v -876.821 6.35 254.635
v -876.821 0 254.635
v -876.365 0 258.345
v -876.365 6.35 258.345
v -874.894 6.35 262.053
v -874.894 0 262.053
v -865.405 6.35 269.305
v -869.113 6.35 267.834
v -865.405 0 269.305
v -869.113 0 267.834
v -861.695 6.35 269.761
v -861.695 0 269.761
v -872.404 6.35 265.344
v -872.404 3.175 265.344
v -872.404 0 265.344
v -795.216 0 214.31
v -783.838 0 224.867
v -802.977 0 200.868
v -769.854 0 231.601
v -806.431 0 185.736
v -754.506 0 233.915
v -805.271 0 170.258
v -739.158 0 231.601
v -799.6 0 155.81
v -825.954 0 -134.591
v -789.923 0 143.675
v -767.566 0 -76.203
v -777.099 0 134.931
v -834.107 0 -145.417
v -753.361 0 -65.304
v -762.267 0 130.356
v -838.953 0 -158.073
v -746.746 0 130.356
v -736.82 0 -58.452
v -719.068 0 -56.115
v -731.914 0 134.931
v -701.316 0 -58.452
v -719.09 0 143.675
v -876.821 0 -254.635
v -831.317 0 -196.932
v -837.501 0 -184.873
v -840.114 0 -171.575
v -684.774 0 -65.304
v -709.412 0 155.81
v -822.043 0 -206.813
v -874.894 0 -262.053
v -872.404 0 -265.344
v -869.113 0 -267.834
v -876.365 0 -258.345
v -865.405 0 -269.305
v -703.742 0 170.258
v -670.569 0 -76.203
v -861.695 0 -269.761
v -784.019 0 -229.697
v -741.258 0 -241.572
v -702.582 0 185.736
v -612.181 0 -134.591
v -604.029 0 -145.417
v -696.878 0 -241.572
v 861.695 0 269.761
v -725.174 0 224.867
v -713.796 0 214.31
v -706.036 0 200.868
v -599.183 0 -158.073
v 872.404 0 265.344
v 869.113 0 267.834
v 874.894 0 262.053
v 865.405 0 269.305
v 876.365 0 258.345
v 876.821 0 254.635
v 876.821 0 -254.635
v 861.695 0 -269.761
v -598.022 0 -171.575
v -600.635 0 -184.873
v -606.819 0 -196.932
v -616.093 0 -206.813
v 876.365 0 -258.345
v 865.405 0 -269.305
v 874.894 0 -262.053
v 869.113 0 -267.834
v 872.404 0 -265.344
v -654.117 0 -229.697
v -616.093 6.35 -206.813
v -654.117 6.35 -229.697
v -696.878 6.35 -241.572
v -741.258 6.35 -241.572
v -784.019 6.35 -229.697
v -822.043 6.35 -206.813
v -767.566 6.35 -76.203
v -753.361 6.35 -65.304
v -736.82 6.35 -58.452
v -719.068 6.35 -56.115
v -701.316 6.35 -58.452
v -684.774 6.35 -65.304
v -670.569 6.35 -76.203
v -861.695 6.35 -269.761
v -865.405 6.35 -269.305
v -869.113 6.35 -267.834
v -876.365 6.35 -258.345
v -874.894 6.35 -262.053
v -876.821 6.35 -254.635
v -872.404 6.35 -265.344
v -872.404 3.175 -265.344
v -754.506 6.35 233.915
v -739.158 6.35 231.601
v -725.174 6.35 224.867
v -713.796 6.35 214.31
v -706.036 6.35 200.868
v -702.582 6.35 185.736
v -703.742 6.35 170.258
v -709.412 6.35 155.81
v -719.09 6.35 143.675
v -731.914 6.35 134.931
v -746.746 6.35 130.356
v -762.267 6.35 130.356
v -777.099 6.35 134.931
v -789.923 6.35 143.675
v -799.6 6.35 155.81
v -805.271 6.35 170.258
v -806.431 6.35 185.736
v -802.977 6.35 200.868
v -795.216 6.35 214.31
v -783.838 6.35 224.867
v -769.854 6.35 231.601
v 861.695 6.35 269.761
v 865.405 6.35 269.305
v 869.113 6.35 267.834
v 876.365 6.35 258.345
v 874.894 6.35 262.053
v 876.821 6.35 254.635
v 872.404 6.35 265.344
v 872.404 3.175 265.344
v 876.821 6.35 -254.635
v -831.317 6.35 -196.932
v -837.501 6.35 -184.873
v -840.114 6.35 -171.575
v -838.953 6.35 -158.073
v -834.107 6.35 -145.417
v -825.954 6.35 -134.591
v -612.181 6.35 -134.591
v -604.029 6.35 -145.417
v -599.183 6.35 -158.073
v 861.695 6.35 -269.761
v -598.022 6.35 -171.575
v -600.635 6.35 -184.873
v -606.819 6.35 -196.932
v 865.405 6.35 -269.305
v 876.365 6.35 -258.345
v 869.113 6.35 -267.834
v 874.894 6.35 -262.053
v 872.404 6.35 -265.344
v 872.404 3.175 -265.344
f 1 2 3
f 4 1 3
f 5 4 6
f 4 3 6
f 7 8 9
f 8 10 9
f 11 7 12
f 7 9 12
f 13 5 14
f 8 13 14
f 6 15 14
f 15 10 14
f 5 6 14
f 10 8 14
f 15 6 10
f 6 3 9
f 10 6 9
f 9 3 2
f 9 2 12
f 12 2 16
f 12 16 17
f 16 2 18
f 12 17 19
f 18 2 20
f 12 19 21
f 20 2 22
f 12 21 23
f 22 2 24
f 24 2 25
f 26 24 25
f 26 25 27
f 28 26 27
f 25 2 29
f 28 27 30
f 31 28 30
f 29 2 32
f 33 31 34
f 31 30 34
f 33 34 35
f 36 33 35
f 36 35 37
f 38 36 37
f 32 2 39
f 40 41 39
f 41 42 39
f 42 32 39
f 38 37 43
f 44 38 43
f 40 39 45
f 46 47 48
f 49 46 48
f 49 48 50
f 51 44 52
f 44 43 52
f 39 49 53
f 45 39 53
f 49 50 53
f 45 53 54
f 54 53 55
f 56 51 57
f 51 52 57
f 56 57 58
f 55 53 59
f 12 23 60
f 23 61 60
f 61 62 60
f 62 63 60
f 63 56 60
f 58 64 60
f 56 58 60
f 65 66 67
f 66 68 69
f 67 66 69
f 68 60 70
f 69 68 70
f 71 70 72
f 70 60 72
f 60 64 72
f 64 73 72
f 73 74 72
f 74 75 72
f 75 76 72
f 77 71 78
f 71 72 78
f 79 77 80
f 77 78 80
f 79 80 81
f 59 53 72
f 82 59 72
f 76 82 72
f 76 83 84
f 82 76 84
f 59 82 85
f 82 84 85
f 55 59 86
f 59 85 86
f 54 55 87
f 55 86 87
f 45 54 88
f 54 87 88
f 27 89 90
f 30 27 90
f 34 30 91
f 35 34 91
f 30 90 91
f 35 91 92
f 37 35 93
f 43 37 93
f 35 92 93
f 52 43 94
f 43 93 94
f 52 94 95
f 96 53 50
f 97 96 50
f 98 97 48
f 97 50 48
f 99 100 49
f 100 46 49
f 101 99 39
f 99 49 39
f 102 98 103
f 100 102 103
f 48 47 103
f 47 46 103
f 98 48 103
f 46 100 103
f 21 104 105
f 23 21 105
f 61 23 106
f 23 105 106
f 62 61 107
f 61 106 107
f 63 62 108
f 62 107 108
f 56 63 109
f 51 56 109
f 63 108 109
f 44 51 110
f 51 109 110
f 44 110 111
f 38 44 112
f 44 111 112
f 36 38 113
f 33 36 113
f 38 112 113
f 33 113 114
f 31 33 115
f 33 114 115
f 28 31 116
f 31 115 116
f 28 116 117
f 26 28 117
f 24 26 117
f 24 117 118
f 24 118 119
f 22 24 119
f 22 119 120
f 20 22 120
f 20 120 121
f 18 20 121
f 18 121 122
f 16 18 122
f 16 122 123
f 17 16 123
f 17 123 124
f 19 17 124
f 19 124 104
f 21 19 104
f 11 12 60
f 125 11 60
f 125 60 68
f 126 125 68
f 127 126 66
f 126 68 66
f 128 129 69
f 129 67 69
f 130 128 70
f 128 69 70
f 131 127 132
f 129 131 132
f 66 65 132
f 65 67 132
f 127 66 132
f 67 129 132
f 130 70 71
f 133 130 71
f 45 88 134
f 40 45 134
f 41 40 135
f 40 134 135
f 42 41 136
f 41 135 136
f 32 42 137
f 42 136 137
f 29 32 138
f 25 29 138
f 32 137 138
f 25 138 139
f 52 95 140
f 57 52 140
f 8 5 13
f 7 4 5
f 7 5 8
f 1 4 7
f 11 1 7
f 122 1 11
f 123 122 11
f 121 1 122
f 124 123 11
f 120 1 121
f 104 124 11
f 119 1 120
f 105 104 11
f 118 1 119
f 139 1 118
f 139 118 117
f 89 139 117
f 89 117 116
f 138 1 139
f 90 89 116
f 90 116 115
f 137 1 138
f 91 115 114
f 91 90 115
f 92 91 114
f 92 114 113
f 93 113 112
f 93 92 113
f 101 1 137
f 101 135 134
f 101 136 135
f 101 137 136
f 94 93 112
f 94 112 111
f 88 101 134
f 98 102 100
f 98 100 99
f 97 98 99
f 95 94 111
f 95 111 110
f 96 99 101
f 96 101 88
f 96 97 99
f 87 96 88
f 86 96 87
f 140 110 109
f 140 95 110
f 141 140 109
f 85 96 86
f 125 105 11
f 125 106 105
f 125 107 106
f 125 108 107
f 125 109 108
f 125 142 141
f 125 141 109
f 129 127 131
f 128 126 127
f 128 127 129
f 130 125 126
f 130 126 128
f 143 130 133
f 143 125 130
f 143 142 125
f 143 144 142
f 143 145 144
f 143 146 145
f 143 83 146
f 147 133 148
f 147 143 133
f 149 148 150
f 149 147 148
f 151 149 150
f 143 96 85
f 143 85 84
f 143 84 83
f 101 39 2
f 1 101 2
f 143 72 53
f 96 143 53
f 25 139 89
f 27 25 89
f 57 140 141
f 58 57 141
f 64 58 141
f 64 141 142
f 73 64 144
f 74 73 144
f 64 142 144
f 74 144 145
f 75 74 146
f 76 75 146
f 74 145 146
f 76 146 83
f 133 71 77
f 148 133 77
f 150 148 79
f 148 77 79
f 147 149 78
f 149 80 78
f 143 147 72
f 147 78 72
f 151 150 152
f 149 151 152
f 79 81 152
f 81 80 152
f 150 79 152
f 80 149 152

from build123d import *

# Parameters (mm, degrees)
BOSS_EXTRUDE1_DEPTH = 6.35
CUT_EXTRUDE1_DEPTH  = 918.402376548
SKETCH3_R           = 52.07
CUT_EXTRUDE2_DEPTH  = 918.402376548


with BuildPart() as part:
    # Sketch1 → Boss-Extrude1 (new body)
    with BuildSketch(Plane(origin=(0, 0, 0), x_dir=(1, 0, 0), z_dir=(0, 1, 0))):
        with BuildLine():
            Line((-861.694916994, -269.761320345), (861.694916994, -269.761320345))
            add(Edge.make_bspline(
                [(861.694916994, -269.761320345), (876.821320345, -269.761320345), (876.821320345, -254.634916994)],
                knots=[5.505213485, 5.505213485, 5.505213485, 7.061157129, 7.061157129, 7.061157129], degree=2, weights=[1, 0.712338451, 1]))
            Line((876.821320345, -254.634916994), (876.821320345, 254.634916994))
            add(Edge.make_bspline(
                [(876.821320345, 254.634916994), (876.821320345, 269.761320345), (861.694916994, 269.761320345)],
                knots=[5.505213485, 5.505213485, 5.505213485, 7.061157129, 7.061157129, 7.061157129], degree=2, weights=[1, 0.712338451, 1]))
            Line((861.694916994, 269.761320345), (-861.694916994, 269.761320345))
            add(Edge.make_bspline(
                [(-861.694916994, 269.761320345), (-876.821320345, 269.761320345), (-876.821320345, 254.634916994)],
                knots=[5.505213485, 5.505213485, 5.505213485, 7.061157129, 7.061157129, 7.061157129], degree=2, weights=[1, 0.712338451, 1]))
            Line((-876.821320345, 254.634916994), (-876.821320345, -254.634916994))
            add(Edge.make_bspline(
                [(-876.821320345, -254.634916994), (-876.821320345, -269.761320345), (-861.694916994, -269.761320345)],
                knots=[5.505213485, 5.505213485, 5.505213485, 7.061157129, 7.061157129, 7.061157129], degree=2, weights=[1, 0.712338451, 1]))
        make_face()
    extrude(amount=BOSS_EXTRUDE1_DEPTH)

    # Sketch2 → Cut-Extrude1 (cut, through all)
    with BuildSketch(Plane(origin=(0, 6.35, 0), x_dir=(1, 0, 0), z_dir=(0, 1, 0))):
        with BuildLine():
            Line((-825.954313113, 134.591457199), (-767.566332113, 76.203476199))
            ThreePointArc((-767.566332113, 76.203476199), (-719.067867535, 56.114754417), (-670.569402958, 76.203476199))
            Line((-670.569402958, 76.203476199), (-612.181421958, 134.591457199))
            ThreePointArc((-612.181421958, 134.591457199), (-598.021653058, 171.575128433), (-616.092530237, 206.813380252))
            ThreePointArc((-616.092530237, 206.813380252), (-719.067867535, 243.07718636), (-822.043204833, 206.813380252))
            ThreePointArc((-822.043204833, 206.813380252), (-840.114082012, 171.575128433), (-825.954313113, 134.591457199))
        make_face()
    extrude(amount=-CUT_EXTRUDE1_DEPTH, mode=Mode.SUBTRACT)

    # Sketch3 → Cut-Extrude2 (cut, through all)
    with BuildSketch(Plane(origin=(0, 6.35, 0), x_dir=(1, 0, 0), z_dir=(0, 1, 0))):
        with Locations((-754.506388348, -181.844577047)):
            Circle(SKETCH3_R)
    extrude(amount=-CUT_EXTRUDE2_DEPTH, mode=Mode.SUBTRACT)


solid = part.part
